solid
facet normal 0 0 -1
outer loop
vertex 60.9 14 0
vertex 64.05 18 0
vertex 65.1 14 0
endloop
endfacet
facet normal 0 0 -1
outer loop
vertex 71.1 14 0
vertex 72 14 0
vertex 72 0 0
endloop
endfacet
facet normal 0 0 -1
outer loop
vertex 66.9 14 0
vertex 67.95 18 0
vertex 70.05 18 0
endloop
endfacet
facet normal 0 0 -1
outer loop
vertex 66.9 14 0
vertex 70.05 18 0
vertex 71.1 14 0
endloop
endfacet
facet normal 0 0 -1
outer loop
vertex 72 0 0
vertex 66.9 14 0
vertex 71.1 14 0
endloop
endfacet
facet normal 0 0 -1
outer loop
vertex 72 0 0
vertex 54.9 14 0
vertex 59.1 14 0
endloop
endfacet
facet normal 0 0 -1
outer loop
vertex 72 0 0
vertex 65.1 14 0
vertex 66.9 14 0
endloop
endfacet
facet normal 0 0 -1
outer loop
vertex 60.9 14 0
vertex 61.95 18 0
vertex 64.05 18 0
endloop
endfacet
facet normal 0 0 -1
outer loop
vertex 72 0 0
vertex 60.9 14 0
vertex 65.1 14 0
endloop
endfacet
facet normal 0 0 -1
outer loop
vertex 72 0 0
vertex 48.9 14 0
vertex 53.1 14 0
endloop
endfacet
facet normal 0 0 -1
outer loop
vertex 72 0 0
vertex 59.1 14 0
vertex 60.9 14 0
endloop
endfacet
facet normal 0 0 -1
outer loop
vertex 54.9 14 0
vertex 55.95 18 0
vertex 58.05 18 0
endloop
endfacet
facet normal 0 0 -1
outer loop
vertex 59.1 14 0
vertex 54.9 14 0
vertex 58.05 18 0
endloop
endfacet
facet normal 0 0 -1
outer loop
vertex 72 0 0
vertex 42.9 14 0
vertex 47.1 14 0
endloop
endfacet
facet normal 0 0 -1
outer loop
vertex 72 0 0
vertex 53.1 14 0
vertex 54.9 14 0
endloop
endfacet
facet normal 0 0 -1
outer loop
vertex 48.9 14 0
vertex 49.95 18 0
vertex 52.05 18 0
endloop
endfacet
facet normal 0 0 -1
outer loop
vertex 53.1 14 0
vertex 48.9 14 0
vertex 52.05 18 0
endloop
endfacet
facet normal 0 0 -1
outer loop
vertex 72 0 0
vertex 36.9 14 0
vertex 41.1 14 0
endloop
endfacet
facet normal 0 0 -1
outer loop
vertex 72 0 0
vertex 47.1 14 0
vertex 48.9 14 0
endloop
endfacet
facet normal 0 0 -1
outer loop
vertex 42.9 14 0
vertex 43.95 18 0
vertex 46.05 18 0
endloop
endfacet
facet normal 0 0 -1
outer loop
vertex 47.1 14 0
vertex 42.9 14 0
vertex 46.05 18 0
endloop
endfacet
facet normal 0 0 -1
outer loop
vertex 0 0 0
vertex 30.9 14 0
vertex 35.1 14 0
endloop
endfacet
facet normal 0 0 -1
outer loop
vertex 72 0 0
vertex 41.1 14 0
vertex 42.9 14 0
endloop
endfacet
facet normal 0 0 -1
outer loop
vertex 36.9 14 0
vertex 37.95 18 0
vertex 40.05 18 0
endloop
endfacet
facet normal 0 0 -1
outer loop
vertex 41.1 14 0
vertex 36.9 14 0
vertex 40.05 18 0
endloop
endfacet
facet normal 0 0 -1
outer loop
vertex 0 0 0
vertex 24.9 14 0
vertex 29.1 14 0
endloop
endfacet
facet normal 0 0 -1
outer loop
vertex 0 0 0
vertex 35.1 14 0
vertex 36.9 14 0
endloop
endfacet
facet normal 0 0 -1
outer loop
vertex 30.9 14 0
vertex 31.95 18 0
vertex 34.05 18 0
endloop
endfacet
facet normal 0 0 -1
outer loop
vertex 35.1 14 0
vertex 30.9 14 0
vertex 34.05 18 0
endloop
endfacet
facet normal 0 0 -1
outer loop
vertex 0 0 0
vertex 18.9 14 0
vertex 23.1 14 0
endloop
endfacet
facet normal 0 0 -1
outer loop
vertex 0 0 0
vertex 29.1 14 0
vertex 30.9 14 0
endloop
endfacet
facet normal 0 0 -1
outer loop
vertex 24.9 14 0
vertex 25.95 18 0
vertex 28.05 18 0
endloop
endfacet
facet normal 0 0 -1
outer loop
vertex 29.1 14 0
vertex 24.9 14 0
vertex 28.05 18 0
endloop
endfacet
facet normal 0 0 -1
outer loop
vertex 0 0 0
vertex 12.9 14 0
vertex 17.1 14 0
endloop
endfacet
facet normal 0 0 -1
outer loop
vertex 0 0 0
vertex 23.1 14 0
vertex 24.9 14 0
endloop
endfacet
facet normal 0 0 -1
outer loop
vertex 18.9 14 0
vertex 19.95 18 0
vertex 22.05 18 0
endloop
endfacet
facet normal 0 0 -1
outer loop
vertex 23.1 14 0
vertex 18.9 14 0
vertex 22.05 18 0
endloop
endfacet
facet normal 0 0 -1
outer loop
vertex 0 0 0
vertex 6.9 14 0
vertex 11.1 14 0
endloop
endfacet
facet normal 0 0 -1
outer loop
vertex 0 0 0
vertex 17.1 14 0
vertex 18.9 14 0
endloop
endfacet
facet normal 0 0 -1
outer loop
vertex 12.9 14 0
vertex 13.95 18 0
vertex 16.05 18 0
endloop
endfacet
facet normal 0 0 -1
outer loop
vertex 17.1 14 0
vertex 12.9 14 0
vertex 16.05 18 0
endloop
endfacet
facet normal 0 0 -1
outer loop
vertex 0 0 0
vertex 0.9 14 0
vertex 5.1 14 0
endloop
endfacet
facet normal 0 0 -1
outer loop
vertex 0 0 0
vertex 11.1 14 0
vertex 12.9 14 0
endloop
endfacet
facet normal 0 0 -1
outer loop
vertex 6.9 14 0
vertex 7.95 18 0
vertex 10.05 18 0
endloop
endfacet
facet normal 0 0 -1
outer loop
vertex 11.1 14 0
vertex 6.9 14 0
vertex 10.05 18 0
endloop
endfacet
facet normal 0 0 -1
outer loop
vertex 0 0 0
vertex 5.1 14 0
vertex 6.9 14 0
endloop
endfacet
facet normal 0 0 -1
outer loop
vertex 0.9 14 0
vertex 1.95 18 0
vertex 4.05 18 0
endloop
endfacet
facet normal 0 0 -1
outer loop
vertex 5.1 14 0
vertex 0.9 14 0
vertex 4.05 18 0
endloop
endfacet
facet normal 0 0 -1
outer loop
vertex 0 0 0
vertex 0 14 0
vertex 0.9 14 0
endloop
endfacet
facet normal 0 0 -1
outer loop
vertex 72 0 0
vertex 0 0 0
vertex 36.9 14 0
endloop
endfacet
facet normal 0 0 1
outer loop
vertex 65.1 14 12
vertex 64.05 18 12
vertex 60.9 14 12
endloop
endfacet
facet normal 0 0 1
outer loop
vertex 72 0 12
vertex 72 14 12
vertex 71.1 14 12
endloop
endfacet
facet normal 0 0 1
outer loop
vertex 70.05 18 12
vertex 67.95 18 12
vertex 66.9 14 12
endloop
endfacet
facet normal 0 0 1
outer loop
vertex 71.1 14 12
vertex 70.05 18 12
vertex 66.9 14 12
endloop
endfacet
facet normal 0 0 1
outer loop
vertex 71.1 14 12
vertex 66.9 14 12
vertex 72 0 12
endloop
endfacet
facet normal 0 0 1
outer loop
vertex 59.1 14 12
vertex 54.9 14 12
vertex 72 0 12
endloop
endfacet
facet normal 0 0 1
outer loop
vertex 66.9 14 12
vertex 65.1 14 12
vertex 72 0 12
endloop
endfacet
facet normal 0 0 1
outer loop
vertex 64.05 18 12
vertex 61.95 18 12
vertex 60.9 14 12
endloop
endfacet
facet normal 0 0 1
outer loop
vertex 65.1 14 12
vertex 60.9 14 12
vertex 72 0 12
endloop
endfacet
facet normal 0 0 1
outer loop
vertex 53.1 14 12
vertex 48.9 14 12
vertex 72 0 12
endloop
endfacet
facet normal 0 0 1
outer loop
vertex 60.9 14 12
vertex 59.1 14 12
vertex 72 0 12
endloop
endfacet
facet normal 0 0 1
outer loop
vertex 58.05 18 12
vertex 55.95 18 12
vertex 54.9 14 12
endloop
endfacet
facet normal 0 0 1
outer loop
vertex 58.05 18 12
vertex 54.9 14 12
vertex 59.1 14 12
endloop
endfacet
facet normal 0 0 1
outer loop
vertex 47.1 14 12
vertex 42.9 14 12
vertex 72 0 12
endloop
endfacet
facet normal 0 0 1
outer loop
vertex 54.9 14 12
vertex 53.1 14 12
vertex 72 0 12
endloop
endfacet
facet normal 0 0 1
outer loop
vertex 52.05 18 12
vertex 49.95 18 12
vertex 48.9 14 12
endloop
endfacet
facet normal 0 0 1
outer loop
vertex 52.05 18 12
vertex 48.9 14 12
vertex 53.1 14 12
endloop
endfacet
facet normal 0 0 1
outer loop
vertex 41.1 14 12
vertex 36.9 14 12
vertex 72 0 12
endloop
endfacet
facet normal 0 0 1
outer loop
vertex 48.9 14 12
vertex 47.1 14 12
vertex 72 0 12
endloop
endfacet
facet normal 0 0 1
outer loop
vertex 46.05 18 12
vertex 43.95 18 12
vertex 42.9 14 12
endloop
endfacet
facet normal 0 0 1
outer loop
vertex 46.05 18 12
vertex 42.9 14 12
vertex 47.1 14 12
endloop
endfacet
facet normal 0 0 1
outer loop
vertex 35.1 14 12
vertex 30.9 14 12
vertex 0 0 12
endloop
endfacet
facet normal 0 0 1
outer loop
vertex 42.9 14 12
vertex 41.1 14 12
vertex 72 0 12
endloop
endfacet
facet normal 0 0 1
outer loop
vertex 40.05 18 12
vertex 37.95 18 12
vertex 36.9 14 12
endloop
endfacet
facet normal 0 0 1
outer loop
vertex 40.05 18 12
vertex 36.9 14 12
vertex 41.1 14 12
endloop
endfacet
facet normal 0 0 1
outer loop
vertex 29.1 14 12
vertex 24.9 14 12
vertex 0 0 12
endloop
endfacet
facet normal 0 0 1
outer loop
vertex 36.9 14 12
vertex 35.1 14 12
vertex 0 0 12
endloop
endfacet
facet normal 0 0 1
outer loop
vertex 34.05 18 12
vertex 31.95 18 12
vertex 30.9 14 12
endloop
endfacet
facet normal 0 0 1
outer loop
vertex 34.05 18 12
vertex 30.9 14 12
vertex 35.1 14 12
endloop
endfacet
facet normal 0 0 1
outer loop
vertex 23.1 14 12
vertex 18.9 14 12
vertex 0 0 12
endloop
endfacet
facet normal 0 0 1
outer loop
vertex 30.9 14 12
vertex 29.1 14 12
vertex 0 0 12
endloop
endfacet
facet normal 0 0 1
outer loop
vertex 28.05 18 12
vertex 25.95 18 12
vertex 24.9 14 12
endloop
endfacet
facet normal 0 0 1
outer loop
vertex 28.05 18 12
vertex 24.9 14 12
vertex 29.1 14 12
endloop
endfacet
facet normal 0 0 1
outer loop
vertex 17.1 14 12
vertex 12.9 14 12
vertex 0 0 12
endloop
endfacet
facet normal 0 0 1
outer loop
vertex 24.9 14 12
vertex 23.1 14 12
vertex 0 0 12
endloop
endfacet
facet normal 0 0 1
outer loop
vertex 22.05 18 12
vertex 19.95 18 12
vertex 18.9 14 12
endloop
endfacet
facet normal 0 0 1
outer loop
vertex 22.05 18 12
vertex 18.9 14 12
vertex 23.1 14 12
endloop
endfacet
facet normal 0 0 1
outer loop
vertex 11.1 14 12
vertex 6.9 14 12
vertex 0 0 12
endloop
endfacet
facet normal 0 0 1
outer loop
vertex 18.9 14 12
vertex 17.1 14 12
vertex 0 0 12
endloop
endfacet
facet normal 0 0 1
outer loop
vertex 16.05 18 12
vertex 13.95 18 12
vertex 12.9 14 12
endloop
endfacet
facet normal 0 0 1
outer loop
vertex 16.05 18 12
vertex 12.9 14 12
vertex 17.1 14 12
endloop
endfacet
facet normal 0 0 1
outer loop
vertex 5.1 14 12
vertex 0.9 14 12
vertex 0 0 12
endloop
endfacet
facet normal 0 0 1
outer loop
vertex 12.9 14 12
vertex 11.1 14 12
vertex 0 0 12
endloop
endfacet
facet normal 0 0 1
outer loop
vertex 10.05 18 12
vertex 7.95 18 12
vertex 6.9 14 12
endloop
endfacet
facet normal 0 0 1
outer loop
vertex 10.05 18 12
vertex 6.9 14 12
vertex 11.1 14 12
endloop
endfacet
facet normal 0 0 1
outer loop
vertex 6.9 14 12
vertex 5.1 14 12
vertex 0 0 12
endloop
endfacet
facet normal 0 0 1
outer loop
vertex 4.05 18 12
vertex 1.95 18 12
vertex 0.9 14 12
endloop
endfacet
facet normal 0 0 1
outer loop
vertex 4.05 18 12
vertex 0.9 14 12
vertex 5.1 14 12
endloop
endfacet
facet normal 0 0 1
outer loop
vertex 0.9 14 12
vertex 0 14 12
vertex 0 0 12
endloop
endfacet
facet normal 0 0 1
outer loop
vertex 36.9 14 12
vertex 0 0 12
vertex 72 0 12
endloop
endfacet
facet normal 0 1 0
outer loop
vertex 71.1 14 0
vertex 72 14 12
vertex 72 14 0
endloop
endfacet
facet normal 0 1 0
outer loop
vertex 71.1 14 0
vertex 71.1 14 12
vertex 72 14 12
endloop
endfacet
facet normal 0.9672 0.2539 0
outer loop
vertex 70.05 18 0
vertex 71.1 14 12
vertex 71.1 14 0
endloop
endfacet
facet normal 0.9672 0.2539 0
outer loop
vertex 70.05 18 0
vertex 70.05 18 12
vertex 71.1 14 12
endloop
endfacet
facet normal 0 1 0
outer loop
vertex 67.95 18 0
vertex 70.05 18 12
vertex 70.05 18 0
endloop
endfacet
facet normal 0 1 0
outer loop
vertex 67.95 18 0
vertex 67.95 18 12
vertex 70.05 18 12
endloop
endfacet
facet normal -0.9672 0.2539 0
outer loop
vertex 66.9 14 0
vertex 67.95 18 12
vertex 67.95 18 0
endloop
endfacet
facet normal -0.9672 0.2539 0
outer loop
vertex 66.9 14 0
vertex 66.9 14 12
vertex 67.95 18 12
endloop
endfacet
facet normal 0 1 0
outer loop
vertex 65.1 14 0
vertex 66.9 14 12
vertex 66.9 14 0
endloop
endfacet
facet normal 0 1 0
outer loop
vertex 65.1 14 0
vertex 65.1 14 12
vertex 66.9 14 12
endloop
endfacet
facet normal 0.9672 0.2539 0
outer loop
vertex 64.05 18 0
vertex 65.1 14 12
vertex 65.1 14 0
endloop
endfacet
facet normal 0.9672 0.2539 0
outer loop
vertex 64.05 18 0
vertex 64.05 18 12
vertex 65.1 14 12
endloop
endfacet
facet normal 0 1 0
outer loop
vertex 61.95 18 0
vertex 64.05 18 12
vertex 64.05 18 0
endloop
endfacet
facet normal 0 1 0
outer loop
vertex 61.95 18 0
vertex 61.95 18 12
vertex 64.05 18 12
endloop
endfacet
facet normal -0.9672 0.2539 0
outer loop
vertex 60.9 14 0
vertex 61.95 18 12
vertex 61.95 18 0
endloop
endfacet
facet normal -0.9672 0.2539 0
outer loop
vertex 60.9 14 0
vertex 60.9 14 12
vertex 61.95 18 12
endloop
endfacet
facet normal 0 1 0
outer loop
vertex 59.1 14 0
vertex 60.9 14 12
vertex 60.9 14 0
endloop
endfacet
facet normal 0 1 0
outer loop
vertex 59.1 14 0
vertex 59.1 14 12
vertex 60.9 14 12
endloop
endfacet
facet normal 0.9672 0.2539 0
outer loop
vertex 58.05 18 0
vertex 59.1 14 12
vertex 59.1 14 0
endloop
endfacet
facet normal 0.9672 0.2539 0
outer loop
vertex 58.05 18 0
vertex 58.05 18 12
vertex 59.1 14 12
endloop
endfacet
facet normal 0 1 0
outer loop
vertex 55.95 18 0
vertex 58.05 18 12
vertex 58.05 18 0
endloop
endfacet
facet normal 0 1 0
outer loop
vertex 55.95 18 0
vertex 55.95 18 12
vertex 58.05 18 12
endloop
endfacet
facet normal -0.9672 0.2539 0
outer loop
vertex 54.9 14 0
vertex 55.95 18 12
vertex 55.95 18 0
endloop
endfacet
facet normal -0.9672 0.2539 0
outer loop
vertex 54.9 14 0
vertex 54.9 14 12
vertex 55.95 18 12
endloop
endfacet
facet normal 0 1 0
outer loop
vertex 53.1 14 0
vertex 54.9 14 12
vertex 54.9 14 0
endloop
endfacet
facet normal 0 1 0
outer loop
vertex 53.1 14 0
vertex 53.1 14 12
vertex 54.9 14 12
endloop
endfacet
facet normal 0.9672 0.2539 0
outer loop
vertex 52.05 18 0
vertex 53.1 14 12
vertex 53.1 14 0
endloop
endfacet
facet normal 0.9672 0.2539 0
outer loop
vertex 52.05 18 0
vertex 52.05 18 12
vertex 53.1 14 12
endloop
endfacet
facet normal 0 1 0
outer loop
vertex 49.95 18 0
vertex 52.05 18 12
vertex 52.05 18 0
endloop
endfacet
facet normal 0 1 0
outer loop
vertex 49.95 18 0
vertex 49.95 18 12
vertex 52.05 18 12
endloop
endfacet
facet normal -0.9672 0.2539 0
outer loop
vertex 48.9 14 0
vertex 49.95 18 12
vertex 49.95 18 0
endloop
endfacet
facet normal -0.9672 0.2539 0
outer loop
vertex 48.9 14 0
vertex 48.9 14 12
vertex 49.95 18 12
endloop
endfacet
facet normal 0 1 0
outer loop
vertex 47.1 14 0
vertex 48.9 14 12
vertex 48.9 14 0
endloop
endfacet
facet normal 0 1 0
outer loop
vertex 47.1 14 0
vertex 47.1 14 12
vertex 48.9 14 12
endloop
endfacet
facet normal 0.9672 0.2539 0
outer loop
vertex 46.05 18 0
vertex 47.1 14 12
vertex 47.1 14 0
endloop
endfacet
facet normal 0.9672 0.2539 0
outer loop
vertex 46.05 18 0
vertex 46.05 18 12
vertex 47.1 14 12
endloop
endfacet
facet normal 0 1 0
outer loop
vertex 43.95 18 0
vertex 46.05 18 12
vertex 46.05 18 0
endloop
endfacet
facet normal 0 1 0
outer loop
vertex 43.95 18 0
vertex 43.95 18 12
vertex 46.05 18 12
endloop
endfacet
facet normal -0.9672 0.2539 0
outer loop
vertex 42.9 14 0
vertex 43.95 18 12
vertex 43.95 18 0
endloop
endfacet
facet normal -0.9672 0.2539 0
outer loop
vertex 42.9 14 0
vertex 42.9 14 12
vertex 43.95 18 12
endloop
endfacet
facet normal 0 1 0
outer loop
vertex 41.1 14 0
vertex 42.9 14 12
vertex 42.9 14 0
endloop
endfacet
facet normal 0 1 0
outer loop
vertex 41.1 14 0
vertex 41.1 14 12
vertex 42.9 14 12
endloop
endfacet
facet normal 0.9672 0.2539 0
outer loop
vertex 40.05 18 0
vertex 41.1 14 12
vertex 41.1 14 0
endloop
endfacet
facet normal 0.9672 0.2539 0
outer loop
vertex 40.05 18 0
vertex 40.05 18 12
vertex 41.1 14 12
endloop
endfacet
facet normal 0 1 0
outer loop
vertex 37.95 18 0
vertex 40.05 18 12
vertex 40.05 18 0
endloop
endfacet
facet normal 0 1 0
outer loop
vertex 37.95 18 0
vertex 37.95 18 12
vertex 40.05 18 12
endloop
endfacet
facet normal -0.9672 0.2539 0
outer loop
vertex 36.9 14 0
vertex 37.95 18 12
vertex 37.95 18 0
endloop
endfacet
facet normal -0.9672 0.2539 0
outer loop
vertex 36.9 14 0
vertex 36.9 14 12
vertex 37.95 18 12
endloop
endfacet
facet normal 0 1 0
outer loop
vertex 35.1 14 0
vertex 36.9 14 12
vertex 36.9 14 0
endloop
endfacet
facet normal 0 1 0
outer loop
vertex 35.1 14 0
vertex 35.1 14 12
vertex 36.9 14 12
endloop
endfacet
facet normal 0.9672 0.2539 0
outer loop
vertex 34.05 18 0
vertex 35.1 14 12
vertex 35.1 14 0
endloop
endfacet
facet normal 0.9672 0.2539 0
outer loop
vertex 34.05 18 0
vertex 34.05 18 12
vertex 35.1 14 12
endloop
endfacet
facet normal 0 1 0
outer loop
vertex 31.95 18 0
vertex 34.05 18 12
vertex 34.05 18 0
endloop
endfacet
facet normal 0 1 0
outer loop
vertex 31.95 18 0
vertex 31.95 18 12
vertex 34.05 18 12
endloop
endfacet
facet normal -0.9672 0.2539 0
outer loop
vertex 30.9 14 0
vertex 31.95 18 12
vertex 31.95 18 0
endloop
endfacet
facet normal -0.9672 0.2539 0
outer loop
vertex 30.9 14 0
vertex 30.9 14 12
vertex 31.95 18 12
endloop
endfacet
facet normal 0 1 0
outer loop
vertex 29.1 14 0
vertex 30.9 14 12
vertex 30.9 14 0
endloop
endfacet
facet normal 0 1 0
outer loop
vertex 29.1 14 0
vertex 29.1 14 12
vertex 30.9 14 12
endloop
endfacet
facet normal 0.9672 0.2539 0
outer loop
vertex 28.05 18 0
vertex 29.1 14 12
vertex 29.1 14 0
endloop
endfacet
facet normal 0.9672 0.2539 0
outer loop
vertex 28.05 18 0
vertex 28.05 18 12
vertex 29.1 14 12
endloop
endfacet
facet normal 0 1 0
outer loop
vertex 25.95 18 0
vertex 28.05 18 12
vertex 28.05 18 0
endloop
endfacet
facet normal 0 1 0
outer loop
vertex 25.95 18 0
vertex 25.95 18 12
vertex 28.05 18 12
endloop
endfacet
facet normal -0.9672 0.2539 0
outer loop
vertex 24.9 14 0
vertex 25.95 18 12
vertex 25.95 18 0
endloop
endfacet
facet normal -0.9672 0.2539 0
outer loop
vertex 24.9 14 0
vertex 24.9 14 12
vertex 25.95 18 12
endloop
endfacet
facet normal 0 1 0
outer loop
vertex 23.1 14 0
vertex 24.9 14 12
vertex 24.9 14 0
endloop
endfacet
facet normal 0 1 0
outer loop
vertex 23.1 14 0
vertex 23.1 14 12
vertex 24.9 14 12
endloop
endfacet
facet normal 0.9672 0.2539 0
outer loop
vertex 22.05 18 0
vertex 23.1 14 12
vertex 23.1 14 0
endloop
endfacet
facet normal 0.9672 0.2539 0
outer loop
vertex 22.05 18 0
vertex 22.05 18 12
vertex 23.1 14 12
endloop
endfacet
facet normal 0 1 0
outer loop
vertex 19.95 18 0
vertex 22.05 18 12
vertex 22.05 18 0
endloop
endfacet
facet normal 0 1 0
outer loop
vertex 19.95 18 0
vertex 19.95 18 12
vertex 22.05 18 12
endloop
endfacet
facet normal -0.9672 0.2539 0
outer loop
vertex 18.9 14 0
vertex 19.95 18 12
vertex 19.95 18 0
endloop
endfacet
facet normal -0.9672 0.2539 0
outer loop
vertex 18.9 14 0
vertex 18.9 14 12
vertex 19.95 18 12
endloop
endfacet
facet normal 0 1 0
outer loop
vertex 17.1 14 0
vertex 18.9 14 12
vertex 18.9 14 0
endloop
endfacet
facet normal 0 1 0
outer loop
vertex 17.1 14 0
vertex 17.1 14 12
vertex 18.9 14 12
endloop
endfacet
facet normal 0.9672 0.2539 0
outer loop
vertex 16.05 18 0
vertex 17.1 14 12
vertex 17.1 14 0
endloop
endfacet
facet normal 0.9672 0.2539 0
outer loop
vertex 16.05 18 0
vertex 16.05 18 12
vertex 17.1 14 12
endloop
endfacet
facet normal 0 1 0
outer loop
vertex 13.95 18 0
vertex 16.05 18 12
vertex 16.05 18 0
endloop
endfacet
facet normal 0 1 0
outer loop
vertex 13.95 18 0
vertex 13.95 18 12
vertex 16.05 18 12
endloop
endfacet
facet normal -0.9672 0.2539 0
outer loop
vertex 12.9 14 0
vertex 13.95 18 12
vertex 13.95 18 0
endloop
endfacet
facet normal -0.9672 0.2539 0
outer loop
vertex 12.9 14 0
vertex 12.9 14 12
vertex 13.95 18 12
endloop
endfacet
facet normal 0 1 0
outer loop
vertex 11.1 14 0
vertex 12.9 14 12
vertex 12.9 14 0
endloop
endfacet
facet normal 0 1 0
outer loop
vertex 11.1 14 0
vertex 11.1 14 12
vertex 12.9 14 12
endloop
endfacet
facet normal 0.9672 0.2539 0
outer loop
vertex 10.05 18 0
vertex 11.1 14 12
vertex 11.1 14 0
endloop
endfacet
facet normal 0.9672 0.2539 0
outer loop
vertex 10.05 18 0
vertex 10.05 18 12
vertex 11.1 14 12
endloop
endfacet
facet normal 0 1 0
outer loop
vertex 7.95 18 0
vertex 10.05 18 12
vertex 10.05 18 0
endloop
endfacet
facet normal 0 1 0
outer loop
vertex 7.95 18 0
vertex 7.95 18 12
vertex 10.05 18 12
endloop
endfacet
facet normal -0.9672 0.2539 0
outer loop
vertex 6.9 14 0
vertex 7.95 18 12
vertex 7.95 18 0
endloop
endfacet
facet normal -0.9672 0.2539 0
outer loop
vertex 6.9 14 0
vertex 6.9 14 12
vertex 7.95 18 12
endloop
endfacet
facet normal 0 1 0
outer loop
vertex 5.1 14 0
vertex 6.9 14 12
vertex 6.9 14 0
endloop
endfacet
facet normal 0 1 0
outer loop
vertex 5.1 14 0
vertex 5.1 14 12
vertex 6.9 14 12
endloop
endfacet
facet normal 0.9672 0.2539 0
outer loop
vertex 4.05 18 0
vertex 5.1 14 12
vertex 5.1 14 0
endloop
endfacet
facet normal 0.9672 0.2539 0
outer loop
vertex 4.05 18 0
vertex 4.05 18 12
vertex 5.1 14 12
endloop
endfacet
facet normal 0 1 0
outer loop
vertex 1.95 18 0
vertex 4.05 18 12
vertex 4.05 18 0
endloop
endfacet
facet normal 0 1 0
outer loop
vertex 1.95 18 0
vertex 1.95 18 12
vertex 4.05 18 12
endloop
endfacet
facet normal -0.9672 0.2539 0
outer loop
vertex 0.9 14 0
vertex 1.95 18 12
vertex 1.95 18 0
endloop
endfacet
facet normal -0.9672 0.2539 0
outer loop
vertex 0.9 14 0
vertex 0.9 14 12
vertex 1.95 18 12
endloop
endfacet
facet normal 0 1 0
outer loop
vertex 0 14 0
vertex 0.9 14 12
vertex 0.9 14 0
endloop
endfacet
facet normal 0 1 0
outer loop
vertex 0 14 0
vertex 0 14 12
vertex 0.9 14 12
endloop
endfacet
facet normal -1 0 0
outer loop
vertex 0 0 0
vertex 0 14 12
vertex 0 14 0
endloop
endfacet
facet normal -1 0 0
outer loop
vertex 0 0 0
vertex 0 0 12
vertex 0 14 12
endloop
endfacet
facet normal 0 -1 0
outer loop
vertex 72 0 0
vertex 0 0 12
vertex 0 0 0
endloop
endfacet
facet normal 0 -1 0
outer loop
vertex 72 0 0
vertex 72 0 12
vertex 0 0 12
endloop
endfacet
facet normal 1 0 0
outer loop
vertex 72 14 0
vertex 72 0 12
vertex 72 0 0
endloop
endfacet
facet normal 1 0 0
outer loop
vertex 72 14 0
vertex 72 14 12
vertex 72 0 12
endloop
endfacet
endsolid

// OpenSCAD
$fn = 32;

// ----------------------------------------------------------------------
// Gear rack: 12 teeth, pitch 6 mm
// ----------------------------------------------------------------------

// --- parameters (mm) ---
teeth = 12;               // number of teeth
pitch = 6;                // tooth pitch, X
root_w = 4.2;             // tooth width at the root
tip_w = 2.1;              // tooth width at the tip
base_h = 14;              // rack body height, Y
tooth_h = 4;              // tooth height above the body
plate_t = 12;             // rack width, Z (extrusion height)

rack_l = teeth * pitch;  // overall length
total_h = base_h + tooth_h;  // overall height

profile = [[0, 0], [72, 0], [72, 14], [71.1, 14], [70.05, 18], [67.95, 18], [66.9, 14], [65.1, 14], [64.05, 18], [61.95, 18], [60.9, 14], [59.1, 14], [58.05, 18], [55.95, 18], [54.9, 14], [53.1, 14], [52.05, 18], [49.95, 18], [48.9, 14], [47.1, 14], [46.05, 18], [43.95, 18], [42.9, 14], [41.1, 14], [40.05, 18], [37.95, 18], [36.9, 14], [35.1, 14], [34.05, 18], [31.95, 18], [30.9, 14], [29.1, 14], [28.05, 18], [25.95, 18], [24.9, 14], [23.1, 14], [22.05, 18], [19.95, 18], [18.9, 14], [17.1, 14], [16.05, 18], [13.95, 18], [12.9, 14], [11.1, 14], [10.05, 18], [7.95, 18], [6.9, 14], [5.1, 14], [4.05, 18], [1.95, 18], [0.9, 14], [0, 14]];  // primary outline, 52 points, counter clockwise

// --- the one profile operation ---
linear_extrude(height = plate_t) polygon(points = profile);
